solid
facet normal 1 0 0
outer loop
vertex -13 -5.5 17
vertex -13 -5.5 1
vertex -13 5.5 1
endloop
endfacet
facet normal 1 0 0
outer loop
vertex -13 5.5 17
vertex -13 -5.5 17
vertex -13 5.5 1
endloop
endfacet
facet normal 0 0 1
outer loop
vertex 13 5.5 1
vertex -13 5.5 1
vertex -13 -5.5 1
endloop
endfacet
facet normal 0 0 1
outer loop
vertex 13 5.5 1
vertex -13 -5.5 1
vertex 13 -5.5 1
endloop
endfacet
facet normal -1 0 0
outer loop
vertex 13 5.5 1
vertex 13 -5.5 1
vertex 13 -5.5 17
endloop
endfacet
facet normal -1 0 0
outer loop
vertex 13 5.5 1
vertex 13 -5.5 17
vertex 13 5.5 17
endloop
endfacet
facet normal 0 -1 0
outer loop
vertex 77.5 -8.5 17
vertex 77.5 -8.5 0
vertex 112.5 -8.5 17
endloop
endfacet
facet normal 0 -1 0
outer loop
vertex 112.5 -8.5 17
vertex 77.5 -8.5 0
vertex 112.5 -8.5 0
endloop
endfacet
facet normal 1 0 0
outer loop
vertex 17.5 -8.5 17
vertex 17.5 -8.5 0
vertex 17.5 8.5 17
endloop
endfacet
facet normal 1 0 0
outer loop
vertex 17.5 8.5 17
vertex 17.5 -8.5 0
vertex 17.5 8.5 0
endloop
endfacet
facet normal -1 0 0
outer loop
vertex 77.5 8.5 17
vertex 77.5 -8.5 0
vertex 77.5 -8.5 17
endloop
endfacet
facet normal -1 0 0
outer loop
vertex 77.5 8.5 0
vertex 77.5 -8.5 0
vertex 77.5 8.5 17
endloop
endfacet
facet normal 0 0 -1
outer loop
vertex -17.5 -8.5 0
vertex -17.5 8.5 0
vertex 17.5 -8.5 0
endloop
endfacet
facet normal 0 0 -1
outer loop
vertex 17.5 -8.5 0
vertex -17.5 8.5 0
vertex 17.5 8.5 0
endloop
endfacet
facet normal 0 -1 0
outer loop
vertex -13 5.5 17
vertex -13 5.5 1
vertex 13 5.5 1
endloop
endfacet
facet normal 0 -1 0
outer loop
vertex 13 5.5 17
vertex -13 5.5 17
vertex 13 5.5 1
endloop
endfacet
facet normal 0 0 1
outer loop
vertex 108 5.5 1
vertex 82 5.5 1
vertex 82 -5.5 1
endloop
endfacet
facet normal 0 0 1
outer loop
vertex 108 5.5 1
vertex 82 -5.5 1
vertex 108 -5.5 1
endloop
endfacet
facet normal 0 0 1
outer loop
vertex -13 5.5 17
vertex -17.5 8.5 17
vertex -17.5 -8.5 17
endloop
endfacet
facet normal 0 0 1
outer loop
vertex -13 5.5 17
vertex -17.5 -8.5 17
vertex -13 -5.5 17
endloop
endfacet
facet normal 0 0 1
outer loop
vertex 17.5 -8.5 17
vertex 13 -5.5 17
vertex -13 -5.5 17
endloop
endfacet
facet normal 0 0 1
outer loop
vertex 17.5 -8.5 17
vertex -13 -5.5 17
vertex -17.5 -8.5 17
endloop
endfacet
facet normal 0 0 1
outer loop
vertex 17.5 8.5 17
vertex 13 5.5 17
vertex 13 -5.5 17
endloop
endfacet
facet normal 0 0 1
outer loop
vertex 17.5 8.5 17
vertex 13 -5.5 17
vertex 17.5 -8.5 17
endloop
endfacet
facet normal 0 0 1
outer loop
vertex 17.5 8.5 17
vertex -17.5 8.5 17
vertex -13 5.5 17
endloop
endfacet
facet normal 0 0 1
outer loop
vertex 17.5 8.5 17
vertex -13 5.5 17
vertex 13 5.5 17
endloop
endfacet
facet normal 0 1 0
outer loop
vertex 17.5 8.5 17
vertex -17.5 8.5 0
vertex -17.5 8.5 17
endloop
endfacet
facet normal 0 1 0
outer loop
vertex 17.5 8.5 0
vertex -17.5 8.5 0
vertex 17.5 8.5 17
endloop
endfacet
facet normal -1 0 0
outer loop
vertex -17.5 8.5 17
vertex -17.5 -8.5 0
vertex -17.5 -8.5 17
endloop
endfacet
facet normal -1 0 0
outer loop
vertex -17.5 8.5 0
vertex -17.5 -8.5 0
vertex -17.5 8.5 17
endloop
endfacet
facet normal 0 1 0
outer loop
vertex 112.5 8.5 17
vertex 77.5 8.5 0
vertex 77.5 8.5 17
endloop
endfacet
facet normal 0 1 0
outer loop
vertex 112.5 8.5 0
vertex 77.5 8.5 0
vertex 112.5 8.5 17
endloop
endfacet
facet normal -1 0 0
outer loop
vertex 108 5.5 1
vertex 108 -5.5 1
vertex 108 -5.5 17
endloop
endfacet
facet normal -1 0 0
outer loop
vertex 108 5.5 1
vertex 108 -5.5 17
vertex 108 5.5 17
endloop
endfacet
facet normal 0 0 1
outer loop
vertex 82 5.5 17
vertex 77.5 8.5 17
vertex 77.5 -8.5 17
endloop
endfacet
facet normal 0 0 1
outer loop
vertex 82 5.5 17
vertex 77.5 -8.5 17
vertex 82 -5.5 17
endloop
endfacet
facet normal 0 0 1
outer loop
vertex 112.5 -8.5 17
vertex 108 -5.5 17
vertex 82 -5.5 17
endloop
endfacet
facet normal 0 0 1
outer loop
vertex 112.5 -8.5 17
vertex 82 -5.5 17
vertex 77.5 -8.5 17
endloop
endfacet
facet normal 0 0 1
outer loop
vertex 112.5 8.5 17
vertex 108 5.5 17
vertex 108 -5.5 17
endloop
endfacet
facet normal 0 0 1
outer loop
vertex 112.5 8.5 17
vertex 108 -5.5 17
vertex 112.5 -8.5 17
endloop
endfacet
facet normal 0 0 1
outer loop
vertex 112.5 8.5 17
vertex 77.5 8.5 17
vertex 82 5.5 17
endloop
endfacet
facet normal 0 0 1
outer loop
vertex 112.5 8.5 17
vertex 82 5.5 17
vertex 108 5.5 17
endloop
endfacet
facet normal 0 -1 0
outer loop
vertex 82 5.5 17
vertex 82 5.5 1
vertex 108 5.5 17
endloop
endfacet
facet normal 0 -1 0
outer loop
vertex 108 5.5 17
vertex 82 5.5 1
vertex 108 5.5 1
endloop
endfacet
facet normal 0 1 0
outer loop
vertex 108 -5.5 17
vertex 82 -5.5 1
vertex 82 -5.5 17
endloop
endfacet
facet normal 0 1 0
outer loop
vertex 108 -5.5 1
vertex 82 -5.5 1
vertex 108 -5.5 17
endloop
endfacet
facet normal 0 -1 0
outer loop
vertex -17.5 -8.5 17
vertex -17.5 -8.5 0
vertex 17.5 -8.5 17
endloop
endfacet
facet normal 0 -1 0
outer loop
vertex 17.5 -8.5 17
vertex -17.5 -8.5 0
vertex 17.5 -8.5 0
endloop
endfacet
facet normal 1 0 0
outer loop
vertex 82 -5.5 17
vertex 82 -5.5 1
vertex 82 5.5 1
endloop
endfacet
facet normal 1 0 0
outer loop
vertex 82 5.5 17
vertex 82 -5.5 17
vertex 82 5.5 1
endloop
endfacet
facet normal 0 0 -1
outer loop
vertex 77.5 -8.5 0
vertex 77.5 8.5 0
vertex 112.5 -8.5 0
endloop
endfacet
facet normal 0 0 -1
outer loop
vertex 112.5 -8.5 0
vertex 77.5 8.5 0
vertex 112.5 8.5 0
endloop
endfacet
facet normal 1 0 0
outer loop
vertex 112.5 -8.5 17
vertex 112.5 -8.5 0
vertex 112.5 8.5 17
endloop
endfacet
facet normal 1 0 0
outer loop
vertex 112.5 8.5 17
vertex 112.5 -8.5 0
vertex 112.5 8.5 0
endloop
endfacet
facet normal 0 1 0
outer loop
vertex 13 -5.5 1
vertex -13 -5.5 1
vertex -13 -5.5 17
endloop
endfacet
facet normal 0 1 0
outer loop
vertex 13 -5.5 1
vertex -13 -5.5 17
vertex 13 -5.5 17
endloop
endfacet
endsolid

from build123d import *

# Parameters (mm, degrees)
F0_W     = 26
F0_H     = 11
F1_DEPTH = 1
F0_W_2   = 35
F0_H_2   = 17
F2_DEPTH = 17
F3_DEPTH = 1
F4_DEPTH = 17


with BuildPart() as f1:
    # F0 (on Top) → F1 (new body)
    with BuildSketch(Plane.XY):
        Rectangle(F0_W, F0_H)
    extrude(amount=F1_DEPTH)

    # F0 (on Top) → F2 (join)
    with BuildSketch(Plane.XY):
        Rectangle(F0_W_2, F0_H_2)
        Rectangle(F0_W, F0_H, mode=Mode.SUBTRACT)
    extrude(amount=F2_DEPTH)


with BuildPart() as f3:
    # F0 (on Top) → F3 (new body)
    with BuildSketch(Plane.XY):
        with Locations((95, 0)):
            Rectangle(F0_W, F0_H)
    extrude(amount=F3_DEPTH)

    # F0 (on Top) → F4 (join)
    with BuildSketch(Plane.XY):
        with Locations((95, 0)):
            Rectangle(F0_W_2, F0_H_2)
        with Locations((95, 0)):
            Rectangle(F0_W, F0_H, mode=Mode.SUBTRACT)
    extrude(amount=F4_DEPTH)


solid = Compound([f1.part, f3.part])
